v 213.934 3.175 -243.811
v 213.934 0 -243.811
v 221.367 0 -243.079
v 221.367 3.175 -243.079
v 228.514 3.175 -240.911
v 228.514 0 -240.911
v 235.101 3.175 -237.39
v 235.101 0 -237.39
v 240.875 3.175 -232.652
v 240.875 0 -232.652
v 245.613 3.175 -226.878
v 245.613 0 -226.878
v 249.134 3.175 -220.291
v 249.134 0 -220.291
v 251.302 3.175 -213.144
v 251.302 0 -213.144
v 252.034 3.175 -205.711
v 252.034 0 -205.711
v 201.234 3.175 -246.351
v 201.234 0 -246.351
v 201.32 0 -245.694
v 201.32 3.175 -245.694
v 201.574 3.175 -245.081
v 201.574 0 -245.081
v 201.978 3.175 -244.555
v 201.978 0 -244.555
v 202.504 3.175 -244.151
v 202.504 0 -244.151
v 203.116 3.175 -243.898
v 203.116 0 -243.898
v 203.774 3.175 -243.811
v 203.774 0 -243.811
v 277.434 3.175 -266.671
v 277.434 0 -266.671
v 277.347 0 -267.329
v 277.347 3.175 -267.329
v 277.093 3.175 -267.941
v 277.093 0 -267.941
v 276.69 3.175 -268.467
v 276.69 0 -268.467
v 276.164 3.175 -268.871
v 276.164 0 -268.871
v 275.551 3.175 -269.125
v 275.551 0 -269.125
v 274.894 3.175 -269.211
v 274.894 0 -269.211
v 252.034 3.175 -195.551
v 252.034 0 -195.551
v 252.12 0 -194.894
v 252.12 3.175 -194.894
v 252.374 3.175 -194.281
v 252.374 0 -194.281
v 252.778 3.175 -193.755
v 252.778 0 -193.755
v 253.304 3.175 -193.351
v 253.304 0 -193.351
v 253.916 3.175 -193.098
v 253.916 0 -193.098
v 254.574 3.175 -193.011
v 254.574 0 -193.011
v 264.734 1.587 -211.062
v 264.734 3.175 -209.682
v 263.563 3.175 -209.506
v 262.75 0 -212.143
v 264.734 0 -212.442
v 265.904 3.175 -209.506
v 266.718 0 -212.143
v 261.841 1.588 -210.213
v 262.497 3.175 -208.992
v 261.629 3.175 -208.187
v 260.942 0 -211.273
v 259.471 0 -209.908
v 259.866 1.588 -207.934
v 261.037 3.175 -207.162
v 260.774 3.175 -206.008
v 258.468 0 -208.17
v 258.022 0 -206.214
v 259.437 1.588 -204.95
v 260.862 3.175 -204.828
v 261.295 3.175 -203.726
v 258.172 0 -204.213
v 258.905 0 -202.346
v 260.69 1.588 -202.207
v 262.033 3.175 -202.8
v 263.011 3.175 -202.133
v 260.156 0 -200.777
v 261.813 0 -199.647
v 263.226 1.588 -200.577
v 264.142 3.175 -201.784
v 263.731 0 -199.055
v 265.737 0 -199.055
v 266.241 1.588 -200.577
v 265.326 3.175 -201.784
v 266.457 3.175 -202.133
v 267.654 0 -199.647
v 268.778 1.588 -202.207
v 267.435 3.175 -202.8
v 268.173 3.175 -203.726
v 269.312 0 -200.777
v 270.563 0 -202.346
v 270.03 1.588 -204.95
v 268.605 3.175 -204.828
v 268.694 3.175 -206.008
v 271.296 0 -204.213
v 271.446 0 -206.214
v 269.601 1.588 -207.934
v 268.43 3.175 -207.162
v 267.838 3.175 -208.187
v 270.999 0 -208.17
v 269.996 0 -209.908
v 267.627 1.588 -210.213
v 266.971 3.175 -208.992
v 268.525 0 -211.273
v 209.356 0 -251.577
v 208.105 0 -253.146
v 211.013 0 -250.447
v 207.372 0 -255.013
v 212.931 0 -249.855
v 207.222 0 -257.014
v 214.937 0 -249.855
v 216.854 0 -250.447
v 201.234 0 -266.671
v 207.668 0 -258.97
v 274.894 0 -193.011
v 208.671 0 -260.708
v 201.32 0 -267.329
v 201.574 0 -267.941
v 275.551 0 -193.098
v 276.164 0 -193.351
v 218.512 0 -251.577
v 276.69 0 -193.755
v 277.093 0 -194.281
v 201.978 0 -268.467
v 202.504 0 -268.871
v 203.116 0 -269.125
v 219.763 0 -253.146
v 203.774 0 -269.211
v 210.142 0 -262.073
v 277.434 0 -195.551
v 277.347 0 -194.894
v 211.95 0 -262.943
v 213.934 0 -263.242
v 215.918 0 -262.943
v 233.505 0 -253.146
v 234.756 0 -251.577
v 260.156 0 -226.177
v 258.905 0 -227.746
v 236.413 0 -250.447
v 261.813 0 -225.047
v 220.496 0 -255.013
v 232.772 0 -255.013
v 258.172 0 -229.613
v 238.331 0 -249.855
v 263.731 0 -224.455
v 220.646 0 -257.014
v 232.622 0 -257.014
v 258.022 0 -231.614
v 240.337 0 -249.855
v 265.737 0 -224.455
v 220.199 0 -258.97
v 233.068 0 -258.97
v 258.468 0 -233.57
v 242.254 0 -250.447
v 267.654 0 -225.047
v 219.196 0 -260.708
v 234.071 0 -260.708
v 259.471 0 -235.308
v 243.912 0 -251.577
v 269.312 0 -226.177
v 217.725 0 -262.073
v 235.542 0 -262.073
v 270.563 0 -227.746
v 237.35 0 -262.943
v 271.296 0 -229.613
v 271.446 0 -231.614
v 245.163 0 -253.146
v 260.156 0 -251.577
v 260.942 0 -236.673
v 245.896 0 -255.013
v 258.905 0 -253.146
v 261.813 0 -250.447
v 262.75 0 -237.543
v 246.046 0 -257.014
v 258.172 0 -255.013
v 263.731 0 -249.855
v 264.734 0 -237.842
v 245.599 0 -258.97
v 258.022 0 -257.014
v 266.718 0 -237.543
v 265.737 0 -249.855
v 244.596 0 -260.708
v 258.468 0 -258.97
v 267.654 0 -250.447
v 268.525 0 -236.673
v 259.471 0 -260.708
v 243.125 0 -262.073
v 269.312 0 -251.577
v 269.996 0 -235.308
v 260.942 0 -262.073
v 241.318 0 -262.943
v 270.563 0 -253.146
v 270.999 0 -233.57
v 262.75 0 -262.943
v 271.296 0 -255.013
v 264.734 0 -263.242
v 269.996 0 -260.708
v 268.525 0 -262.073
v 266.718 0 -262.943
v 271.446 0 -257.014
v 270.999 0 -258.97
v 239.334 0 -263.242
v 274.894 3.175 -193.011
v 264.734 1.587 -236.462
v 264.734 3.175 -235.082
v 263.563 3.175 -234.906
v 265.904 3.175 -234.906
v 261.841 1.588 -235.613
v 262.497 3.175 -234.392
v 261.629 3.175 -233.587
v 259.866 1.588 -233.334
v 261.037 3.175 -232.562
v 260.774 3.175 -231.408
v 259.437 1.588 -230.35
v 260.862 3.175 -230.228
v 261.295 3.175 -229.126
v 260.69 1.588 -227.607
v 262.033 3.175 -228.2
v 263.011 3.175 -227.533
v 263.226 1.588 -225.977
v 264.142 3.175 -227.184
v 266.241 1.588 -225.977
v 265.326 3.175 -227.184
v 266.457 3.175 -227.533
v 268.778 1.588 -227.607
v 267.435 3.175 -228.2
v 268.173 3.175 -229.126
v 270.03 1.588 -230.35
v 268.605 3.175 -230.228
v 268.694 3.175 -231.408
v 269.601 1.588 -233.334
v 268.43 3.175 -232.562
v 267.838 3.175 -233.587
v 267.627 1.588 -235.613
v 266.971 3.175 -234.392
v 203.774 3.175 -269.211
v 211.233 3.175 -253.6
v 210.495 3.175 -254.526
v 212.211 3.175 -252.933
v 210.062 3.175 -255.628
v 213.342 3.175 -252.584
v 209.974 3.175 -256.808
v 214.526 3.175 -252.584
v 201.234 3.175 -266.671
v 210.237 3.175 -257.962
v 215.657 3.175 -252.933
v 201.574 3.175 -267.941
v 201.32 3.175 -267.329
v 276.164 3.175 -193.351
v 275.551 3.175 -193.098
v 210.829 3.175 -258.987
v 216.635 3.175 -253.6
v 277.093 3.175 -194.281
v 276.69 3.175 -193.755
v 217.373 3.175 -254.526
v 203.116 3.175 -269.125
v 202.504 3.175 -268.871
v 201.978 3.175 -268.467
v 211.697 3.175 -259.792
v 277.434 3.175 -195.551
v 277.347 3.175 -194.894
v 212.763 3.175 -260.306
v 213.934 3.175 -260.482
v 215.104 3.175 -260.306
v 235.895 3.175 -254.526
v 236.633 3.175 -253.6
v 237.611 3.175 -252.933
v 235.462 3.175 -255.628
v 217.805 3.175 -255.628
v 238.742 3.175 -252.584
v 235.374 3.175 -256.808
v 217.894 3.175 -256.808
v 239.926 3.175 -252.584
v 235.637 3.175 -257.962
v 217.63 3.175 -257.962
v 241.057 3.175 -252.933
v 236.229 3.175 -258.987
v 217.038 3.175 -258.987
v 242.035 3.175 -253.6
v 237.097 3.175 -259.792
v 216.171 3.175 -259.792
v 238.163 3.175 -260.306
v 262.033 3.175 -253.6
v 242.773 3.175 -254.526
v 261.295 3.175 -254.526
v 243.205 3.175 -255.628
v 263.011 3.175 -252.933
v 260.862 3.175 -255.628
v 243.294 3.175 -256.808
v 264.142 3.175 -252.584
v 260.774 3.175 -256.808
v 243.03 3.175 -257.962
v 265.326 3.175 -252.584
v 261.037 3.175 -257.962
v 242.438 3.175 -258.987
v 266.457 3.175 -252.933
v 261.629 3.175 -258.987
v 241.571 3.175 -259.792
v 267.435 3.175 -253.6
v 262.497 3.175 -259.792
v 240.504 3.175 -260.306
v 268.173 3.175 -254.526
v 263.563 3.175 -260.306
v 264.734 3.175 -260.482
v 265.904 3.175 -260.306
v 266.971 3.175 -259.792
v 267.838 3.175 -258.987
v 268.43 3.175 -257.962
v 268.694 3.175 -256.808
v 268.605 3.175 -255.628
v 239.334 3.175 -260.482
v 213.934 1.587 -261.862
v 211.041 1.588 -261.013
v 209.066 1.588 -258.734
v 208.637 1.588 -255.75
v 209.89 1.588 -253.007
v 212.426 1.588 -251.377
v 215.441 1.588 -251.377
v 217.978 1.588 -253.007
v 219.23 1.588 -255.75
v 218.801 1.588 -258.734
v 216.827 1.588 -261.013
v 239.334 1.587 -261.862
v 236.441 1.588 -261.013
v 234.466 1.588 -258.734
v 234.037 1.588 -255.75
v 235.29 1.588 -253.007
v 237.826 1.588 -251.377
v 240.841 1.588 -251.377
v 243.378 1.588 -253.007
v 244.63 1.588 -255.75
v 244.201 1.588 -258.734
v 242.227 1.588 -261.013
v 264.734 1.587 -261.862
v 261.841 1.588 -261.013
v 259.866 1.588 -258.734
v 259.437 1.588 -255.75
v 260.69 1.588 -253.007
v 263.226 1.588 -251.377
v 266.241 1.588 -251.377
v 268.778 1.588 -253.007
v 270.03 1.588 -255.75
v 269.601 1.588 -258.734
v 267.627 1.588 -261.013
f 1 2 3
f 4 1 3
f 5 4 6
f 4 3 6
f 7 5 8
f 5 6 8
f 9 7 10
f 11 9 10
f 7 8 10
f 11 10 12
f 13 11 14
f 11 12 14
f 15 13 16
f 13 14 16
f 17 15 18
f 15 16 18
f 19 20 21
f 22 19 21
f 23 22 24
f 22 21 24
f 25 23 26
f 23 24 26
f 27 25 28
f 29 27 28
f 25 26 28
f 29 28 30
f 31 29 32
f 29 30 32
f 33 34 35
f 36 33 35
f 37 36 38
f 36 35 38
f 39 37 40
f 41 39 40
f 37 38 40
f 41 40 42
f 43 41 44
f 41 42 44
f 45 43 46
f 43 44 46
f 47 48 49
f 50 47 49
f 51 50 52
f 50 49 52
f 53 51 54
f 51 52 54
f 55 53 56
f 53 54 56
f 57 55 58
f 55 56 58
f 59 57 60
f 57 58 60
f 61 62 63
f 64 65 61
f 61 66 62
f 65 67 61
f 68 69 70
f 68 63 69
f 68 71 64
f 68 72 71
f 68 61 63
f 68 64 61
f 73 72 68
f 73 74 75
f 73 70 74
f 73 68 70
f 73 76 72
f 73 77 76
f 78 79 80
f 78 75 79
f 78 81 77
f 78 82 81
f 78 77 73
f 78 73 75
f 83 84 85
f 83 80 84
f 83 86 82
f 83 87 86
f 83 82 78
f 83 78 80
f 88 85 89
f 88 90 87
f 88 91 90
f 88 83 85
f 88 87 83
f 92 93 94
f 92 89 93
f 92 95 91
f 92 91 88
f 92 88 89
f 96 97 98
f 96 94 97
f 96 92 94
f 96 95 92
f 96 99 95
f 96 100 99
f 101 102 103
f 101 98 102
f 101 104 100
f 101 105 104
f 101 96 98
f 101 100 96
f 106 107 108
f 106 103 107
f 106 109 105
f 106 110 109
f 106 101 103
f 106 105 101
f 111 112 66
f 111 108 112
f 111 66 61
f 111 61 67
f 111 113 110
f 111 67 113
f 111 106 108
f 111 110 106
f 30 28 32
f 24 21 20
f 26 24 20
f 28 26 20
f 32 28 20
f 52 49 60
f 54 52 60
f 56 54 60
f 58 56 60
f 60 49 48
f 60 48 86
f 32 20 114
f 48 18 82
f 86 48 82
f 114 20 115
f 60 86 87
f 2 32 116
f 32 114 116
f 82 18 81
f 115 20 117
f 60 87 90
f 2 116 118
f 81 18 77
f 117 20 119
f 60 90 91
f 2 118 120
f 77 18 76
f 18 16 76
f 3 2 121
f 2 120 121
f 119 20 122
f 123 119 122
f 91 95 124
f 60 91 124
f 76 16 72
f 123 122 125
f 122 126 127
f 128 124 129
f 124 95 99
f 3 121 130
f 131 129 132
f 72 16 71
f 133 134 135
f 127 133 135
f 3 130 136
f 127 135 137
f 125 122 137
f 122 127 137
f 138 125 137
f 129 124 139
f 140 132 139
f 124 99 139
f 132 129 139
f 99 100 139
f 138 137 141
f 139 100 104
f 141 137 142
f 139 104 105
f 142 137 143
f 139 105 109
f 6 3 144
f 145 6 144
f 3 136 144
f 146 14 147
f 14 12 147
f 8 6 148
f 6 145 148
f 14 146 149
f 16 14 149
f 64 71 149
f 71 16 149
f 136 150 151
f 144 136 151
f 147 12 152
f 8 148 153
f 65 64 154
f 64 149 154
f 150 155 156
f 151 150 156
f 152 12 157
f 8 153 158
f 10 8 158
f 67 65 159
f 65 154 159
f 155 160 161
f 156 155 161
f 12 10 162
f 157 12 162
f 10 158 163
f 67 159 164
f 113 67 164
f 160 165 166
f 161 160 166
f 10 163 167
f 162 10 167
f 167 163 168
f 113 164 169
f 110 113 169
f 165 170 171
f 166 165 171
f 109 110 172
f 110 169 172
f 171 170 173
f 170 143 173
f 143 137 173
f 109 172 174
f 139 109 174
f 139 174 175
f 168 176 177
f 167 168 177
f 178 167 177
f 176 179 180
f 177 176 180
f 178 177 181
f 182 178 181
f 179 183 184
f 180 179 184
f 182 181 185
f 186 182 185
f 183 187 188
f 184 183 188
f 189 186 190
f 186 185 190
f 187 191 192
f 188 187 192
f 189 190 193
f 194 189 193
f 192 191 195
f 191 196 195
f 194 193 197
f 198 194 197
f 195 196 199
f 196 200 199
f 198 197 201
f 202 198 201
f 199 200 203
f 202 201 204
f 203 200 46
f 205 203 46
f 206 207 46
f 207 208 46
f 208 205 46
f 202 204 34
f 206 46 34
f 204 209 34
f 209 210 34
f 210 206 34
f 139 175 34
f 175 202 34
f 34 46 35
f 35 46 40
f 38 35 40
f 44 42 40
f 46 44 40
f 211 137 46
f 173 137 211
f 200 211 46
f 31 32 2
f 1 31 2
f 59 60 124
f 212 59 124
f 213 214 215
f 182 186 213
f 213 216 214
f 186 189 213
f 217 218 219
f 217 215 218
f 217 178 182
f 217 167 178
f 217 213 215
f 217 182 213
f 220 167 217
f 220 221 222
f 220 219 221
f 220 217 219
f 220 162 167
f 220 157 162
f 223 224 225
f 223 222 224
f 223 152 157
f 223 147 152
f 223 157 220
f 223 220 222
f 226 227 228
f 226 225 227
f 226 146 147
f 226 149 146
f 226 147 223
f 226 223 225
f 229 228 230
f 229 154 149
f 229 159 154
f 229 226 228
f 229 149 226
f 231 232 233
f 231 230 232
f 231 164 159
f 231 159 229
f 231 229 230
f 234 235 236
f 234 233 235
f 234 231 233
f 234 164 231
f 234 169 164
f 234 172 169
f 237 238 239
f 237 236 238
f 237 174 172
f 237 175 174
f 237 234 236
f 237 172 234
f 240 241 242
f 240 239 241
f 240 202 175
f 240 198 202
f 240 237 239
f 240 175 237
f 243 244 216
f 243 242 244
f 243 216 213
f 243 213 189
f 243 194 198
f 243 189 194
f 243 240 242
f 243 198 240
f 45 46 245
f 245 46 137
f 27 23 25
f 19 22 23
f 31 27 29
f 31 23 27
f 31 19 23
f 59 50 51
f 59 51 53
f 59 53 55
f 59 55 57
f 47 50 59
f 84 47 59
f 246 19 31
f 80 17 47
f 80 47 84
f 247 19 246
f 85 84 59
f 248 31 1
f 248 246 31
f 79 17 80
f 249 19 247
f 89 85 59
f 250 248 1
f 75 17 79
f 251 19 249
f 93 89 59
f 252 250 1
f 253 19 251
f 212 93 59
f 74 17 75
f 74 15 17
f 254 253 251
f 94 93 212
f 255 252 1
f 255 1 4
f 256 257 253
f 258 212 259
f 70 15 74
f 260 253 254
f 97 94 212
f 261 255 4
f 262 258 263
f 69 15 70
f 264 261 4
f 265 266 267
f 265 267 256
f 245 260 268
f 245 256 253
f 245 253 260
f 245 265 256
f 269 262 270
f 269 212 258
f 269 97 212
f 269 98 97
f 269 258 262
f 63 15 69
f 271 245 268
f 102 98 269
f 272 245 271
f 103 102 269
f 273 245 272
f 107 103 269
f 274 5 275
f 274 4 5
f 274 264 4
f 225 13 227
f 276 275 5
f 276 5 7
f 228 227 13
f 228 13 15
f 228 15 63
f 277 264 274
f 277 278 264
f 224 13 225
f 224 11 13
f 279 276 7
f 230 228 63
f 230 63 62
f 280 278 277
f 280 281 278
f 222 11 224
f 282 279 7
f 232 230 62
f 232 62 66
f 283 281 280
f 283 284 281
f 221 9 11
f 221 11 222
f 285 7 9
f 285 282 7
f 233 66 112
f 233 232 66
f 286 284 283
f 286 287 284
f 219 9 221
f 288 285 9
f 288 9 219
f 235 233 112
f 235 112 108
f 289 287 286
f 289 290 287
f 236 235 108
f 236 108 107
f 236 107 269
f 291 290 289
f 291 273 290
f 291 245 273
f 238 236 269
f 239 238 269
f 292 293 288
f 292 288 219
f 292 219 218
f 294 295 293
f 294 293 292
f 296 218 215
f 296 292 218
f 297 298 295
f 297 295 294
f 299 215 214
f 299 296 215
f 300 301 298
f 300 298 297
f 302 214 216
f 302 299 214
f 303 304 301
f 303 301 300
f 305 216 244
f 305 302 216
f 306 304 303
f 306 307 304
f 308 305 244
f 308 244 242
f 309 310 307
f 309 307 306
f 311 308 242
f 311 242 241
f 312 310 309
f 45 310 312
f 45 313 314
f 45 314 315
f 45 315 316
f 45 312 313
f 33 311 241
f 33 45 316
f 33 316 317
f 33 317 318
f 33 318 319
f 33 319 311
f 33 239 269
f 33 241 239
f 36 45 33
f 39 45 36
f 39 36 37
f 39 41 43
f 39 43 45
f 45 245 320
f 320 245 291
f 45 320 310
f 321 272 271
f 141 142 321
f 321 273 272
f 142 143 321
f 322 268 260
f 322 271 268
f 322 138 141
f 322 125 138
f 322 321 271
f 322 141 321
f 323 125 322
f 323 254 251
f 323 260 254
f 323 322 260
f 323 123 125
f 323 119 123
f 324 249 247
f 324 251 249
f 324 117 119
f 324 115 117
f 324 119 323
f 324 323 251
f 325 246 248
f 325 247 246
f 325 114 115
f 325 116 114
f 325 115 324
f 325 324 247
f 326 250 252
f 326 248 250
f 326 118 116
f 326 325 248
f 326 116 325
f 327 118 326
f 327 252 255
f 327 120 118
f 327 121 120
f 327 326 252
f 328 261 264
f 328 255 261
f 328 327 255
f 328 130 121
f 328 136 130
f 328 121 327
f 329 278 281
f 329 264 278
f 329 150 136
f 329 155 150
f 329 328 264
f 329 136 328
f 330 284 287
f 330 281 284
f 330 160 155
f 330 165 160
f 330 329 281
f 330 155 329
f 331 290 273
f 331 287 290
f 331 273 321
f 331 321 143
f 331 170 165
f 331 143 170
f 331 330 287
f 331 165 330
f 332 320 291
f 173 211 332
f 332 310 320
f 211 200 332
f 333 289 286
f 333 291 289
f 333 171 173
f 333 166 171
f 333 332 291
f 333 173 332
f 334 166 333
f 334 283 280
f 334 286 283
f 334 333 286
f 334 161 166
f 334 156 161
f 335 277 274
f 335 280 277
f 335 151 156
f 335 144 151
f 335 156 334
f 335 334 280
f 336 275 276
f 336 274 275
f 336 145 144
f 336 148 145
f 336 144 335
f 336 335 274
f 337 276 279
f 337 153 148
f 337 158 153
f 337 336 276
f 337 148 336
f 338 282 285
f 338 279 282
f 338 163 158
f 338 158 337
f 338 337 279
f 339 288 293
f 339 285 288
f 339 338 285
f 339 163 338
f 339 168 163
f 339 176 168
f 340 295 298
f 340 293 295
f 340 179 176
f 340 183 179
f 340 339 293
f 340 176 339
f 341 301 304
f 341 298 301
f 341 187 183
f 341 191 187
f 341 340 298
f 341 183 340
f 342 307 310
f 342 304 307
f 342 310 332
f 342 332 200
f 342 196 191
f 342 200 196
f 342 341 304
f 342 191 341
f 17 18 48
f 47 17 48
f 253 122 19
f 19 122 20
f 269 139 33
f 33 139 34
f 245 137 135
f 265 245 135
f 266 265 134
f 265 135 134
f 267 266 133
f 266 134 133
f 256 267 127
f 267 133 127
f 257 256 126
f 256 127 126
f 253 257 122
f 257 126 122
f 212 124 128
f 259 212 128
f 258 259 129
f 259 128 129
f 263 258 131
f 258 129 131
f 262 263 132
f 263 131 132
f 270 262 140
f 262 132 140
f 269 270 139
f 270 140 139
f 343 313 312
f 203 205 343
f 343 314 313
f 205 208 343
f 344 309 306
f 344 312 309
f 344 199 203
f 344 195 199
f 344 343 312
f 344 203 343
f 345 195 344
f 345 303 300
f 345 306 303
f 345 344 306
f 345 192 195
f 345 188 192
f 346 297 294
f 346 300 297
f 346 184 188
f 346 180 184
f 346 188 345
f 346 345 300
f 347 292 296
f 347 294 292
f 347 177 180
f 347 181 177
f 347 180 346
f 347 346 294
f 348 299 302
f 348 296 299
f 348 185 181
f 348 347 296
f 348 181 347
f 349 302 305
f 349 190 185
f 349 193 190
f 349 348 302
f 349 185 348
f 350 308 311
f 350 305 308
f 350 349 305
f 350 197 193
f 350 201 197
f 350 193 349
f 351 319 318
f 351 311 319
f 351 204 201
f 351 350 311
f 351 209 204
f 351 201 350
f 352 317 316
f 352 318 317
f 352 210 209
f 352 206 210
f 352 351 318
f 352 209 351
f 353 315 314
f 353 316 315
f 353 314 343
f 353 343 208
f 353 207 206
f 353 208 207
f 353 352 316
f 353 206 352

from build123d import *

# Parameters (mm, degrees)
BOSS_EXTRUDE1_DEPTH                  = 3.175
F_1_4_0_25_DIAMETER_HOLE1_AT_2_COUNT = 2
F_1_4_0_25_DIAMETER_HOLE1_AT_2_PITCH = 25.4
F_1_4_0_25_DIAMETER_HOLE1_AT_3_COUNT = 2
F_1_4_0_25_DIAMETER_HOLE1_AT_3_PITCH = 50.8
F_1_4_0_25_DIAMETER_HOLE1_AT_4_COUNT = 2
F_1_4_0_25_DIAMETER_HOLE1_AT_4_PITCH = 56.796126628
F_1_4_0_25_DIAMETER_HOLE1_AT_5_COUNT = 2
F_1_4_0_25_DIAMETER_HOLE1_AT_5_PITCH = 71.842048969


with BuildPart() as part:
    # Sketch1 → Boss-Extrude1 (new body)
    with BuildSketch(Plane(origin=(0, 0, 0), x_dir=(1, 0, 0), z_dir=(0, 1, 0))):
        with BuildLine():
            Line((274.893771244, 269.21115375), (203.773771244, 269.21115375))
            ThreePointArc((203.773771244, 269.21115375), (201.97772002, 268.467204975), (201.233771244, 266.67115375))
            Line((201.233771244, 266.67115375), (201.233771244, 246.35115375))
            ThreePointArc((201.233771244, 246.35115375), (201.97772002, 244.555102526), (203.773771244, 243.81115375))
            Line((203.773771244, 243.81115375), (213.933771244, 243.81115375))
            ThreePointArc((213.933771244, 243.81115375), (240.874539608, 232.651922114), (252.033771244, 205.71115375))
            Line((252.033771244, 205.71115375), (252.033771244, 195.55115375))
            ThreePointArc((252.033771244, 195.55115375), (252.77772002, 193.755102526), (254.573771244, 193.01115375))
            Line((254.573771244, 193.01115375), (274.893771244, 193.01115375))
            ThreePointArc((274.893771244, 193.01115375), (276.689822469, 193.755102526), (277.433771244, 195.55115375))
            Line((277.433771244, 195.55115375), (277.433771244, 266.67115375))
            ThreePointArc((277.433771244, 266.67115375), (276.689822469, 268.467204975), (274.893771244, 269.21115375))
        make_face()
    extrude(amount=BOSS_EXTRUDE1_DEPTH)

    # Sketch4 → 1/4 (0.25) Diameter Hole1 (revolve, cut)
    with BuildSketch(Plane(origin=(264.733771244, 0, -205.71115375), x_dir=(0, 0, -1), z_dir=(1, 0, 0))):
        Polygon((0, 0), (0, 3.175), (3.175, 3.175), (3.175, 4.090710056), (6.731, 0), align=None)
    f_1_4_0_25_diameter_hole1 = revolve(axis=Axis((264.733771244, -6.35, -205.71115375), (0, 1, 0)), mode=Mode.SUBTRACT)

    # 1/4 (0.25) Diameter Hole1 at 2: 1/4 (0.25) Diameter Hole1 ×2
    with Locations(*[(0, 0, -i * F_1_4_0_25_DIAMETER_HOLE1_AT_2_PITCH) for i in range(1, F_1_4_0_25_DIAMETER_HOLE1_AT_2_COUNT)]):
        add(f_1_4_0_25_diameter_hole1, mode=Mode.SUBTRACT)

    # 1/4 (0.25) Diameter Hole1 at 3: 1/4 (0.25) Diameter Hole1 ×2
    with Locations(*[(0, 0, -i * F_1_4_0_25_DIAMETER_HOLE1_AT_3_PITCH) for i in range(1, F_1_4_0_25_DIAMETER_HOLE1_AT_3_COUNT)]):
        add(f_1_4_0_25_diameter_hole1, mode=Mode.SUBTRACT)

    # 1/4 (0.25) Diameter Hole1 at 4: 1/4 (0.25) Diameter Hole1 ×2
    with Locations(*[Vector(-0.44721359549993195, 0, -0.894427190999929) * (i * F_1_4_0_25_DIAMETER_HOLE1_AT_4_PITCH) for i in range(1, F_1_4_0_25_DIAMETER_HOLE1_AT_4_COUNT)]):
        add(f_1_4_0_25_diameter_hole1, mode=Mode.SUBTRACT)

    # 1/4 (0.25) Diameter Hole1 at 5: 1/4 (0.25) Diameter Hole1 ×2
    with Locations(*[Vector(-0.7071067811865277, 0, -0.7071067811865673) * (i * F_1_4_0_25_DIAMETER_HOLE1_AT_5_PITCH) for i in range(1, F_1_4_0_25_DIAMETER_HOLE1_AT_5_COUNT)]):
        add(f_1_4_0_25_diameter_hole1, mode=Mode.SUBTRACT)


solid = part.part
